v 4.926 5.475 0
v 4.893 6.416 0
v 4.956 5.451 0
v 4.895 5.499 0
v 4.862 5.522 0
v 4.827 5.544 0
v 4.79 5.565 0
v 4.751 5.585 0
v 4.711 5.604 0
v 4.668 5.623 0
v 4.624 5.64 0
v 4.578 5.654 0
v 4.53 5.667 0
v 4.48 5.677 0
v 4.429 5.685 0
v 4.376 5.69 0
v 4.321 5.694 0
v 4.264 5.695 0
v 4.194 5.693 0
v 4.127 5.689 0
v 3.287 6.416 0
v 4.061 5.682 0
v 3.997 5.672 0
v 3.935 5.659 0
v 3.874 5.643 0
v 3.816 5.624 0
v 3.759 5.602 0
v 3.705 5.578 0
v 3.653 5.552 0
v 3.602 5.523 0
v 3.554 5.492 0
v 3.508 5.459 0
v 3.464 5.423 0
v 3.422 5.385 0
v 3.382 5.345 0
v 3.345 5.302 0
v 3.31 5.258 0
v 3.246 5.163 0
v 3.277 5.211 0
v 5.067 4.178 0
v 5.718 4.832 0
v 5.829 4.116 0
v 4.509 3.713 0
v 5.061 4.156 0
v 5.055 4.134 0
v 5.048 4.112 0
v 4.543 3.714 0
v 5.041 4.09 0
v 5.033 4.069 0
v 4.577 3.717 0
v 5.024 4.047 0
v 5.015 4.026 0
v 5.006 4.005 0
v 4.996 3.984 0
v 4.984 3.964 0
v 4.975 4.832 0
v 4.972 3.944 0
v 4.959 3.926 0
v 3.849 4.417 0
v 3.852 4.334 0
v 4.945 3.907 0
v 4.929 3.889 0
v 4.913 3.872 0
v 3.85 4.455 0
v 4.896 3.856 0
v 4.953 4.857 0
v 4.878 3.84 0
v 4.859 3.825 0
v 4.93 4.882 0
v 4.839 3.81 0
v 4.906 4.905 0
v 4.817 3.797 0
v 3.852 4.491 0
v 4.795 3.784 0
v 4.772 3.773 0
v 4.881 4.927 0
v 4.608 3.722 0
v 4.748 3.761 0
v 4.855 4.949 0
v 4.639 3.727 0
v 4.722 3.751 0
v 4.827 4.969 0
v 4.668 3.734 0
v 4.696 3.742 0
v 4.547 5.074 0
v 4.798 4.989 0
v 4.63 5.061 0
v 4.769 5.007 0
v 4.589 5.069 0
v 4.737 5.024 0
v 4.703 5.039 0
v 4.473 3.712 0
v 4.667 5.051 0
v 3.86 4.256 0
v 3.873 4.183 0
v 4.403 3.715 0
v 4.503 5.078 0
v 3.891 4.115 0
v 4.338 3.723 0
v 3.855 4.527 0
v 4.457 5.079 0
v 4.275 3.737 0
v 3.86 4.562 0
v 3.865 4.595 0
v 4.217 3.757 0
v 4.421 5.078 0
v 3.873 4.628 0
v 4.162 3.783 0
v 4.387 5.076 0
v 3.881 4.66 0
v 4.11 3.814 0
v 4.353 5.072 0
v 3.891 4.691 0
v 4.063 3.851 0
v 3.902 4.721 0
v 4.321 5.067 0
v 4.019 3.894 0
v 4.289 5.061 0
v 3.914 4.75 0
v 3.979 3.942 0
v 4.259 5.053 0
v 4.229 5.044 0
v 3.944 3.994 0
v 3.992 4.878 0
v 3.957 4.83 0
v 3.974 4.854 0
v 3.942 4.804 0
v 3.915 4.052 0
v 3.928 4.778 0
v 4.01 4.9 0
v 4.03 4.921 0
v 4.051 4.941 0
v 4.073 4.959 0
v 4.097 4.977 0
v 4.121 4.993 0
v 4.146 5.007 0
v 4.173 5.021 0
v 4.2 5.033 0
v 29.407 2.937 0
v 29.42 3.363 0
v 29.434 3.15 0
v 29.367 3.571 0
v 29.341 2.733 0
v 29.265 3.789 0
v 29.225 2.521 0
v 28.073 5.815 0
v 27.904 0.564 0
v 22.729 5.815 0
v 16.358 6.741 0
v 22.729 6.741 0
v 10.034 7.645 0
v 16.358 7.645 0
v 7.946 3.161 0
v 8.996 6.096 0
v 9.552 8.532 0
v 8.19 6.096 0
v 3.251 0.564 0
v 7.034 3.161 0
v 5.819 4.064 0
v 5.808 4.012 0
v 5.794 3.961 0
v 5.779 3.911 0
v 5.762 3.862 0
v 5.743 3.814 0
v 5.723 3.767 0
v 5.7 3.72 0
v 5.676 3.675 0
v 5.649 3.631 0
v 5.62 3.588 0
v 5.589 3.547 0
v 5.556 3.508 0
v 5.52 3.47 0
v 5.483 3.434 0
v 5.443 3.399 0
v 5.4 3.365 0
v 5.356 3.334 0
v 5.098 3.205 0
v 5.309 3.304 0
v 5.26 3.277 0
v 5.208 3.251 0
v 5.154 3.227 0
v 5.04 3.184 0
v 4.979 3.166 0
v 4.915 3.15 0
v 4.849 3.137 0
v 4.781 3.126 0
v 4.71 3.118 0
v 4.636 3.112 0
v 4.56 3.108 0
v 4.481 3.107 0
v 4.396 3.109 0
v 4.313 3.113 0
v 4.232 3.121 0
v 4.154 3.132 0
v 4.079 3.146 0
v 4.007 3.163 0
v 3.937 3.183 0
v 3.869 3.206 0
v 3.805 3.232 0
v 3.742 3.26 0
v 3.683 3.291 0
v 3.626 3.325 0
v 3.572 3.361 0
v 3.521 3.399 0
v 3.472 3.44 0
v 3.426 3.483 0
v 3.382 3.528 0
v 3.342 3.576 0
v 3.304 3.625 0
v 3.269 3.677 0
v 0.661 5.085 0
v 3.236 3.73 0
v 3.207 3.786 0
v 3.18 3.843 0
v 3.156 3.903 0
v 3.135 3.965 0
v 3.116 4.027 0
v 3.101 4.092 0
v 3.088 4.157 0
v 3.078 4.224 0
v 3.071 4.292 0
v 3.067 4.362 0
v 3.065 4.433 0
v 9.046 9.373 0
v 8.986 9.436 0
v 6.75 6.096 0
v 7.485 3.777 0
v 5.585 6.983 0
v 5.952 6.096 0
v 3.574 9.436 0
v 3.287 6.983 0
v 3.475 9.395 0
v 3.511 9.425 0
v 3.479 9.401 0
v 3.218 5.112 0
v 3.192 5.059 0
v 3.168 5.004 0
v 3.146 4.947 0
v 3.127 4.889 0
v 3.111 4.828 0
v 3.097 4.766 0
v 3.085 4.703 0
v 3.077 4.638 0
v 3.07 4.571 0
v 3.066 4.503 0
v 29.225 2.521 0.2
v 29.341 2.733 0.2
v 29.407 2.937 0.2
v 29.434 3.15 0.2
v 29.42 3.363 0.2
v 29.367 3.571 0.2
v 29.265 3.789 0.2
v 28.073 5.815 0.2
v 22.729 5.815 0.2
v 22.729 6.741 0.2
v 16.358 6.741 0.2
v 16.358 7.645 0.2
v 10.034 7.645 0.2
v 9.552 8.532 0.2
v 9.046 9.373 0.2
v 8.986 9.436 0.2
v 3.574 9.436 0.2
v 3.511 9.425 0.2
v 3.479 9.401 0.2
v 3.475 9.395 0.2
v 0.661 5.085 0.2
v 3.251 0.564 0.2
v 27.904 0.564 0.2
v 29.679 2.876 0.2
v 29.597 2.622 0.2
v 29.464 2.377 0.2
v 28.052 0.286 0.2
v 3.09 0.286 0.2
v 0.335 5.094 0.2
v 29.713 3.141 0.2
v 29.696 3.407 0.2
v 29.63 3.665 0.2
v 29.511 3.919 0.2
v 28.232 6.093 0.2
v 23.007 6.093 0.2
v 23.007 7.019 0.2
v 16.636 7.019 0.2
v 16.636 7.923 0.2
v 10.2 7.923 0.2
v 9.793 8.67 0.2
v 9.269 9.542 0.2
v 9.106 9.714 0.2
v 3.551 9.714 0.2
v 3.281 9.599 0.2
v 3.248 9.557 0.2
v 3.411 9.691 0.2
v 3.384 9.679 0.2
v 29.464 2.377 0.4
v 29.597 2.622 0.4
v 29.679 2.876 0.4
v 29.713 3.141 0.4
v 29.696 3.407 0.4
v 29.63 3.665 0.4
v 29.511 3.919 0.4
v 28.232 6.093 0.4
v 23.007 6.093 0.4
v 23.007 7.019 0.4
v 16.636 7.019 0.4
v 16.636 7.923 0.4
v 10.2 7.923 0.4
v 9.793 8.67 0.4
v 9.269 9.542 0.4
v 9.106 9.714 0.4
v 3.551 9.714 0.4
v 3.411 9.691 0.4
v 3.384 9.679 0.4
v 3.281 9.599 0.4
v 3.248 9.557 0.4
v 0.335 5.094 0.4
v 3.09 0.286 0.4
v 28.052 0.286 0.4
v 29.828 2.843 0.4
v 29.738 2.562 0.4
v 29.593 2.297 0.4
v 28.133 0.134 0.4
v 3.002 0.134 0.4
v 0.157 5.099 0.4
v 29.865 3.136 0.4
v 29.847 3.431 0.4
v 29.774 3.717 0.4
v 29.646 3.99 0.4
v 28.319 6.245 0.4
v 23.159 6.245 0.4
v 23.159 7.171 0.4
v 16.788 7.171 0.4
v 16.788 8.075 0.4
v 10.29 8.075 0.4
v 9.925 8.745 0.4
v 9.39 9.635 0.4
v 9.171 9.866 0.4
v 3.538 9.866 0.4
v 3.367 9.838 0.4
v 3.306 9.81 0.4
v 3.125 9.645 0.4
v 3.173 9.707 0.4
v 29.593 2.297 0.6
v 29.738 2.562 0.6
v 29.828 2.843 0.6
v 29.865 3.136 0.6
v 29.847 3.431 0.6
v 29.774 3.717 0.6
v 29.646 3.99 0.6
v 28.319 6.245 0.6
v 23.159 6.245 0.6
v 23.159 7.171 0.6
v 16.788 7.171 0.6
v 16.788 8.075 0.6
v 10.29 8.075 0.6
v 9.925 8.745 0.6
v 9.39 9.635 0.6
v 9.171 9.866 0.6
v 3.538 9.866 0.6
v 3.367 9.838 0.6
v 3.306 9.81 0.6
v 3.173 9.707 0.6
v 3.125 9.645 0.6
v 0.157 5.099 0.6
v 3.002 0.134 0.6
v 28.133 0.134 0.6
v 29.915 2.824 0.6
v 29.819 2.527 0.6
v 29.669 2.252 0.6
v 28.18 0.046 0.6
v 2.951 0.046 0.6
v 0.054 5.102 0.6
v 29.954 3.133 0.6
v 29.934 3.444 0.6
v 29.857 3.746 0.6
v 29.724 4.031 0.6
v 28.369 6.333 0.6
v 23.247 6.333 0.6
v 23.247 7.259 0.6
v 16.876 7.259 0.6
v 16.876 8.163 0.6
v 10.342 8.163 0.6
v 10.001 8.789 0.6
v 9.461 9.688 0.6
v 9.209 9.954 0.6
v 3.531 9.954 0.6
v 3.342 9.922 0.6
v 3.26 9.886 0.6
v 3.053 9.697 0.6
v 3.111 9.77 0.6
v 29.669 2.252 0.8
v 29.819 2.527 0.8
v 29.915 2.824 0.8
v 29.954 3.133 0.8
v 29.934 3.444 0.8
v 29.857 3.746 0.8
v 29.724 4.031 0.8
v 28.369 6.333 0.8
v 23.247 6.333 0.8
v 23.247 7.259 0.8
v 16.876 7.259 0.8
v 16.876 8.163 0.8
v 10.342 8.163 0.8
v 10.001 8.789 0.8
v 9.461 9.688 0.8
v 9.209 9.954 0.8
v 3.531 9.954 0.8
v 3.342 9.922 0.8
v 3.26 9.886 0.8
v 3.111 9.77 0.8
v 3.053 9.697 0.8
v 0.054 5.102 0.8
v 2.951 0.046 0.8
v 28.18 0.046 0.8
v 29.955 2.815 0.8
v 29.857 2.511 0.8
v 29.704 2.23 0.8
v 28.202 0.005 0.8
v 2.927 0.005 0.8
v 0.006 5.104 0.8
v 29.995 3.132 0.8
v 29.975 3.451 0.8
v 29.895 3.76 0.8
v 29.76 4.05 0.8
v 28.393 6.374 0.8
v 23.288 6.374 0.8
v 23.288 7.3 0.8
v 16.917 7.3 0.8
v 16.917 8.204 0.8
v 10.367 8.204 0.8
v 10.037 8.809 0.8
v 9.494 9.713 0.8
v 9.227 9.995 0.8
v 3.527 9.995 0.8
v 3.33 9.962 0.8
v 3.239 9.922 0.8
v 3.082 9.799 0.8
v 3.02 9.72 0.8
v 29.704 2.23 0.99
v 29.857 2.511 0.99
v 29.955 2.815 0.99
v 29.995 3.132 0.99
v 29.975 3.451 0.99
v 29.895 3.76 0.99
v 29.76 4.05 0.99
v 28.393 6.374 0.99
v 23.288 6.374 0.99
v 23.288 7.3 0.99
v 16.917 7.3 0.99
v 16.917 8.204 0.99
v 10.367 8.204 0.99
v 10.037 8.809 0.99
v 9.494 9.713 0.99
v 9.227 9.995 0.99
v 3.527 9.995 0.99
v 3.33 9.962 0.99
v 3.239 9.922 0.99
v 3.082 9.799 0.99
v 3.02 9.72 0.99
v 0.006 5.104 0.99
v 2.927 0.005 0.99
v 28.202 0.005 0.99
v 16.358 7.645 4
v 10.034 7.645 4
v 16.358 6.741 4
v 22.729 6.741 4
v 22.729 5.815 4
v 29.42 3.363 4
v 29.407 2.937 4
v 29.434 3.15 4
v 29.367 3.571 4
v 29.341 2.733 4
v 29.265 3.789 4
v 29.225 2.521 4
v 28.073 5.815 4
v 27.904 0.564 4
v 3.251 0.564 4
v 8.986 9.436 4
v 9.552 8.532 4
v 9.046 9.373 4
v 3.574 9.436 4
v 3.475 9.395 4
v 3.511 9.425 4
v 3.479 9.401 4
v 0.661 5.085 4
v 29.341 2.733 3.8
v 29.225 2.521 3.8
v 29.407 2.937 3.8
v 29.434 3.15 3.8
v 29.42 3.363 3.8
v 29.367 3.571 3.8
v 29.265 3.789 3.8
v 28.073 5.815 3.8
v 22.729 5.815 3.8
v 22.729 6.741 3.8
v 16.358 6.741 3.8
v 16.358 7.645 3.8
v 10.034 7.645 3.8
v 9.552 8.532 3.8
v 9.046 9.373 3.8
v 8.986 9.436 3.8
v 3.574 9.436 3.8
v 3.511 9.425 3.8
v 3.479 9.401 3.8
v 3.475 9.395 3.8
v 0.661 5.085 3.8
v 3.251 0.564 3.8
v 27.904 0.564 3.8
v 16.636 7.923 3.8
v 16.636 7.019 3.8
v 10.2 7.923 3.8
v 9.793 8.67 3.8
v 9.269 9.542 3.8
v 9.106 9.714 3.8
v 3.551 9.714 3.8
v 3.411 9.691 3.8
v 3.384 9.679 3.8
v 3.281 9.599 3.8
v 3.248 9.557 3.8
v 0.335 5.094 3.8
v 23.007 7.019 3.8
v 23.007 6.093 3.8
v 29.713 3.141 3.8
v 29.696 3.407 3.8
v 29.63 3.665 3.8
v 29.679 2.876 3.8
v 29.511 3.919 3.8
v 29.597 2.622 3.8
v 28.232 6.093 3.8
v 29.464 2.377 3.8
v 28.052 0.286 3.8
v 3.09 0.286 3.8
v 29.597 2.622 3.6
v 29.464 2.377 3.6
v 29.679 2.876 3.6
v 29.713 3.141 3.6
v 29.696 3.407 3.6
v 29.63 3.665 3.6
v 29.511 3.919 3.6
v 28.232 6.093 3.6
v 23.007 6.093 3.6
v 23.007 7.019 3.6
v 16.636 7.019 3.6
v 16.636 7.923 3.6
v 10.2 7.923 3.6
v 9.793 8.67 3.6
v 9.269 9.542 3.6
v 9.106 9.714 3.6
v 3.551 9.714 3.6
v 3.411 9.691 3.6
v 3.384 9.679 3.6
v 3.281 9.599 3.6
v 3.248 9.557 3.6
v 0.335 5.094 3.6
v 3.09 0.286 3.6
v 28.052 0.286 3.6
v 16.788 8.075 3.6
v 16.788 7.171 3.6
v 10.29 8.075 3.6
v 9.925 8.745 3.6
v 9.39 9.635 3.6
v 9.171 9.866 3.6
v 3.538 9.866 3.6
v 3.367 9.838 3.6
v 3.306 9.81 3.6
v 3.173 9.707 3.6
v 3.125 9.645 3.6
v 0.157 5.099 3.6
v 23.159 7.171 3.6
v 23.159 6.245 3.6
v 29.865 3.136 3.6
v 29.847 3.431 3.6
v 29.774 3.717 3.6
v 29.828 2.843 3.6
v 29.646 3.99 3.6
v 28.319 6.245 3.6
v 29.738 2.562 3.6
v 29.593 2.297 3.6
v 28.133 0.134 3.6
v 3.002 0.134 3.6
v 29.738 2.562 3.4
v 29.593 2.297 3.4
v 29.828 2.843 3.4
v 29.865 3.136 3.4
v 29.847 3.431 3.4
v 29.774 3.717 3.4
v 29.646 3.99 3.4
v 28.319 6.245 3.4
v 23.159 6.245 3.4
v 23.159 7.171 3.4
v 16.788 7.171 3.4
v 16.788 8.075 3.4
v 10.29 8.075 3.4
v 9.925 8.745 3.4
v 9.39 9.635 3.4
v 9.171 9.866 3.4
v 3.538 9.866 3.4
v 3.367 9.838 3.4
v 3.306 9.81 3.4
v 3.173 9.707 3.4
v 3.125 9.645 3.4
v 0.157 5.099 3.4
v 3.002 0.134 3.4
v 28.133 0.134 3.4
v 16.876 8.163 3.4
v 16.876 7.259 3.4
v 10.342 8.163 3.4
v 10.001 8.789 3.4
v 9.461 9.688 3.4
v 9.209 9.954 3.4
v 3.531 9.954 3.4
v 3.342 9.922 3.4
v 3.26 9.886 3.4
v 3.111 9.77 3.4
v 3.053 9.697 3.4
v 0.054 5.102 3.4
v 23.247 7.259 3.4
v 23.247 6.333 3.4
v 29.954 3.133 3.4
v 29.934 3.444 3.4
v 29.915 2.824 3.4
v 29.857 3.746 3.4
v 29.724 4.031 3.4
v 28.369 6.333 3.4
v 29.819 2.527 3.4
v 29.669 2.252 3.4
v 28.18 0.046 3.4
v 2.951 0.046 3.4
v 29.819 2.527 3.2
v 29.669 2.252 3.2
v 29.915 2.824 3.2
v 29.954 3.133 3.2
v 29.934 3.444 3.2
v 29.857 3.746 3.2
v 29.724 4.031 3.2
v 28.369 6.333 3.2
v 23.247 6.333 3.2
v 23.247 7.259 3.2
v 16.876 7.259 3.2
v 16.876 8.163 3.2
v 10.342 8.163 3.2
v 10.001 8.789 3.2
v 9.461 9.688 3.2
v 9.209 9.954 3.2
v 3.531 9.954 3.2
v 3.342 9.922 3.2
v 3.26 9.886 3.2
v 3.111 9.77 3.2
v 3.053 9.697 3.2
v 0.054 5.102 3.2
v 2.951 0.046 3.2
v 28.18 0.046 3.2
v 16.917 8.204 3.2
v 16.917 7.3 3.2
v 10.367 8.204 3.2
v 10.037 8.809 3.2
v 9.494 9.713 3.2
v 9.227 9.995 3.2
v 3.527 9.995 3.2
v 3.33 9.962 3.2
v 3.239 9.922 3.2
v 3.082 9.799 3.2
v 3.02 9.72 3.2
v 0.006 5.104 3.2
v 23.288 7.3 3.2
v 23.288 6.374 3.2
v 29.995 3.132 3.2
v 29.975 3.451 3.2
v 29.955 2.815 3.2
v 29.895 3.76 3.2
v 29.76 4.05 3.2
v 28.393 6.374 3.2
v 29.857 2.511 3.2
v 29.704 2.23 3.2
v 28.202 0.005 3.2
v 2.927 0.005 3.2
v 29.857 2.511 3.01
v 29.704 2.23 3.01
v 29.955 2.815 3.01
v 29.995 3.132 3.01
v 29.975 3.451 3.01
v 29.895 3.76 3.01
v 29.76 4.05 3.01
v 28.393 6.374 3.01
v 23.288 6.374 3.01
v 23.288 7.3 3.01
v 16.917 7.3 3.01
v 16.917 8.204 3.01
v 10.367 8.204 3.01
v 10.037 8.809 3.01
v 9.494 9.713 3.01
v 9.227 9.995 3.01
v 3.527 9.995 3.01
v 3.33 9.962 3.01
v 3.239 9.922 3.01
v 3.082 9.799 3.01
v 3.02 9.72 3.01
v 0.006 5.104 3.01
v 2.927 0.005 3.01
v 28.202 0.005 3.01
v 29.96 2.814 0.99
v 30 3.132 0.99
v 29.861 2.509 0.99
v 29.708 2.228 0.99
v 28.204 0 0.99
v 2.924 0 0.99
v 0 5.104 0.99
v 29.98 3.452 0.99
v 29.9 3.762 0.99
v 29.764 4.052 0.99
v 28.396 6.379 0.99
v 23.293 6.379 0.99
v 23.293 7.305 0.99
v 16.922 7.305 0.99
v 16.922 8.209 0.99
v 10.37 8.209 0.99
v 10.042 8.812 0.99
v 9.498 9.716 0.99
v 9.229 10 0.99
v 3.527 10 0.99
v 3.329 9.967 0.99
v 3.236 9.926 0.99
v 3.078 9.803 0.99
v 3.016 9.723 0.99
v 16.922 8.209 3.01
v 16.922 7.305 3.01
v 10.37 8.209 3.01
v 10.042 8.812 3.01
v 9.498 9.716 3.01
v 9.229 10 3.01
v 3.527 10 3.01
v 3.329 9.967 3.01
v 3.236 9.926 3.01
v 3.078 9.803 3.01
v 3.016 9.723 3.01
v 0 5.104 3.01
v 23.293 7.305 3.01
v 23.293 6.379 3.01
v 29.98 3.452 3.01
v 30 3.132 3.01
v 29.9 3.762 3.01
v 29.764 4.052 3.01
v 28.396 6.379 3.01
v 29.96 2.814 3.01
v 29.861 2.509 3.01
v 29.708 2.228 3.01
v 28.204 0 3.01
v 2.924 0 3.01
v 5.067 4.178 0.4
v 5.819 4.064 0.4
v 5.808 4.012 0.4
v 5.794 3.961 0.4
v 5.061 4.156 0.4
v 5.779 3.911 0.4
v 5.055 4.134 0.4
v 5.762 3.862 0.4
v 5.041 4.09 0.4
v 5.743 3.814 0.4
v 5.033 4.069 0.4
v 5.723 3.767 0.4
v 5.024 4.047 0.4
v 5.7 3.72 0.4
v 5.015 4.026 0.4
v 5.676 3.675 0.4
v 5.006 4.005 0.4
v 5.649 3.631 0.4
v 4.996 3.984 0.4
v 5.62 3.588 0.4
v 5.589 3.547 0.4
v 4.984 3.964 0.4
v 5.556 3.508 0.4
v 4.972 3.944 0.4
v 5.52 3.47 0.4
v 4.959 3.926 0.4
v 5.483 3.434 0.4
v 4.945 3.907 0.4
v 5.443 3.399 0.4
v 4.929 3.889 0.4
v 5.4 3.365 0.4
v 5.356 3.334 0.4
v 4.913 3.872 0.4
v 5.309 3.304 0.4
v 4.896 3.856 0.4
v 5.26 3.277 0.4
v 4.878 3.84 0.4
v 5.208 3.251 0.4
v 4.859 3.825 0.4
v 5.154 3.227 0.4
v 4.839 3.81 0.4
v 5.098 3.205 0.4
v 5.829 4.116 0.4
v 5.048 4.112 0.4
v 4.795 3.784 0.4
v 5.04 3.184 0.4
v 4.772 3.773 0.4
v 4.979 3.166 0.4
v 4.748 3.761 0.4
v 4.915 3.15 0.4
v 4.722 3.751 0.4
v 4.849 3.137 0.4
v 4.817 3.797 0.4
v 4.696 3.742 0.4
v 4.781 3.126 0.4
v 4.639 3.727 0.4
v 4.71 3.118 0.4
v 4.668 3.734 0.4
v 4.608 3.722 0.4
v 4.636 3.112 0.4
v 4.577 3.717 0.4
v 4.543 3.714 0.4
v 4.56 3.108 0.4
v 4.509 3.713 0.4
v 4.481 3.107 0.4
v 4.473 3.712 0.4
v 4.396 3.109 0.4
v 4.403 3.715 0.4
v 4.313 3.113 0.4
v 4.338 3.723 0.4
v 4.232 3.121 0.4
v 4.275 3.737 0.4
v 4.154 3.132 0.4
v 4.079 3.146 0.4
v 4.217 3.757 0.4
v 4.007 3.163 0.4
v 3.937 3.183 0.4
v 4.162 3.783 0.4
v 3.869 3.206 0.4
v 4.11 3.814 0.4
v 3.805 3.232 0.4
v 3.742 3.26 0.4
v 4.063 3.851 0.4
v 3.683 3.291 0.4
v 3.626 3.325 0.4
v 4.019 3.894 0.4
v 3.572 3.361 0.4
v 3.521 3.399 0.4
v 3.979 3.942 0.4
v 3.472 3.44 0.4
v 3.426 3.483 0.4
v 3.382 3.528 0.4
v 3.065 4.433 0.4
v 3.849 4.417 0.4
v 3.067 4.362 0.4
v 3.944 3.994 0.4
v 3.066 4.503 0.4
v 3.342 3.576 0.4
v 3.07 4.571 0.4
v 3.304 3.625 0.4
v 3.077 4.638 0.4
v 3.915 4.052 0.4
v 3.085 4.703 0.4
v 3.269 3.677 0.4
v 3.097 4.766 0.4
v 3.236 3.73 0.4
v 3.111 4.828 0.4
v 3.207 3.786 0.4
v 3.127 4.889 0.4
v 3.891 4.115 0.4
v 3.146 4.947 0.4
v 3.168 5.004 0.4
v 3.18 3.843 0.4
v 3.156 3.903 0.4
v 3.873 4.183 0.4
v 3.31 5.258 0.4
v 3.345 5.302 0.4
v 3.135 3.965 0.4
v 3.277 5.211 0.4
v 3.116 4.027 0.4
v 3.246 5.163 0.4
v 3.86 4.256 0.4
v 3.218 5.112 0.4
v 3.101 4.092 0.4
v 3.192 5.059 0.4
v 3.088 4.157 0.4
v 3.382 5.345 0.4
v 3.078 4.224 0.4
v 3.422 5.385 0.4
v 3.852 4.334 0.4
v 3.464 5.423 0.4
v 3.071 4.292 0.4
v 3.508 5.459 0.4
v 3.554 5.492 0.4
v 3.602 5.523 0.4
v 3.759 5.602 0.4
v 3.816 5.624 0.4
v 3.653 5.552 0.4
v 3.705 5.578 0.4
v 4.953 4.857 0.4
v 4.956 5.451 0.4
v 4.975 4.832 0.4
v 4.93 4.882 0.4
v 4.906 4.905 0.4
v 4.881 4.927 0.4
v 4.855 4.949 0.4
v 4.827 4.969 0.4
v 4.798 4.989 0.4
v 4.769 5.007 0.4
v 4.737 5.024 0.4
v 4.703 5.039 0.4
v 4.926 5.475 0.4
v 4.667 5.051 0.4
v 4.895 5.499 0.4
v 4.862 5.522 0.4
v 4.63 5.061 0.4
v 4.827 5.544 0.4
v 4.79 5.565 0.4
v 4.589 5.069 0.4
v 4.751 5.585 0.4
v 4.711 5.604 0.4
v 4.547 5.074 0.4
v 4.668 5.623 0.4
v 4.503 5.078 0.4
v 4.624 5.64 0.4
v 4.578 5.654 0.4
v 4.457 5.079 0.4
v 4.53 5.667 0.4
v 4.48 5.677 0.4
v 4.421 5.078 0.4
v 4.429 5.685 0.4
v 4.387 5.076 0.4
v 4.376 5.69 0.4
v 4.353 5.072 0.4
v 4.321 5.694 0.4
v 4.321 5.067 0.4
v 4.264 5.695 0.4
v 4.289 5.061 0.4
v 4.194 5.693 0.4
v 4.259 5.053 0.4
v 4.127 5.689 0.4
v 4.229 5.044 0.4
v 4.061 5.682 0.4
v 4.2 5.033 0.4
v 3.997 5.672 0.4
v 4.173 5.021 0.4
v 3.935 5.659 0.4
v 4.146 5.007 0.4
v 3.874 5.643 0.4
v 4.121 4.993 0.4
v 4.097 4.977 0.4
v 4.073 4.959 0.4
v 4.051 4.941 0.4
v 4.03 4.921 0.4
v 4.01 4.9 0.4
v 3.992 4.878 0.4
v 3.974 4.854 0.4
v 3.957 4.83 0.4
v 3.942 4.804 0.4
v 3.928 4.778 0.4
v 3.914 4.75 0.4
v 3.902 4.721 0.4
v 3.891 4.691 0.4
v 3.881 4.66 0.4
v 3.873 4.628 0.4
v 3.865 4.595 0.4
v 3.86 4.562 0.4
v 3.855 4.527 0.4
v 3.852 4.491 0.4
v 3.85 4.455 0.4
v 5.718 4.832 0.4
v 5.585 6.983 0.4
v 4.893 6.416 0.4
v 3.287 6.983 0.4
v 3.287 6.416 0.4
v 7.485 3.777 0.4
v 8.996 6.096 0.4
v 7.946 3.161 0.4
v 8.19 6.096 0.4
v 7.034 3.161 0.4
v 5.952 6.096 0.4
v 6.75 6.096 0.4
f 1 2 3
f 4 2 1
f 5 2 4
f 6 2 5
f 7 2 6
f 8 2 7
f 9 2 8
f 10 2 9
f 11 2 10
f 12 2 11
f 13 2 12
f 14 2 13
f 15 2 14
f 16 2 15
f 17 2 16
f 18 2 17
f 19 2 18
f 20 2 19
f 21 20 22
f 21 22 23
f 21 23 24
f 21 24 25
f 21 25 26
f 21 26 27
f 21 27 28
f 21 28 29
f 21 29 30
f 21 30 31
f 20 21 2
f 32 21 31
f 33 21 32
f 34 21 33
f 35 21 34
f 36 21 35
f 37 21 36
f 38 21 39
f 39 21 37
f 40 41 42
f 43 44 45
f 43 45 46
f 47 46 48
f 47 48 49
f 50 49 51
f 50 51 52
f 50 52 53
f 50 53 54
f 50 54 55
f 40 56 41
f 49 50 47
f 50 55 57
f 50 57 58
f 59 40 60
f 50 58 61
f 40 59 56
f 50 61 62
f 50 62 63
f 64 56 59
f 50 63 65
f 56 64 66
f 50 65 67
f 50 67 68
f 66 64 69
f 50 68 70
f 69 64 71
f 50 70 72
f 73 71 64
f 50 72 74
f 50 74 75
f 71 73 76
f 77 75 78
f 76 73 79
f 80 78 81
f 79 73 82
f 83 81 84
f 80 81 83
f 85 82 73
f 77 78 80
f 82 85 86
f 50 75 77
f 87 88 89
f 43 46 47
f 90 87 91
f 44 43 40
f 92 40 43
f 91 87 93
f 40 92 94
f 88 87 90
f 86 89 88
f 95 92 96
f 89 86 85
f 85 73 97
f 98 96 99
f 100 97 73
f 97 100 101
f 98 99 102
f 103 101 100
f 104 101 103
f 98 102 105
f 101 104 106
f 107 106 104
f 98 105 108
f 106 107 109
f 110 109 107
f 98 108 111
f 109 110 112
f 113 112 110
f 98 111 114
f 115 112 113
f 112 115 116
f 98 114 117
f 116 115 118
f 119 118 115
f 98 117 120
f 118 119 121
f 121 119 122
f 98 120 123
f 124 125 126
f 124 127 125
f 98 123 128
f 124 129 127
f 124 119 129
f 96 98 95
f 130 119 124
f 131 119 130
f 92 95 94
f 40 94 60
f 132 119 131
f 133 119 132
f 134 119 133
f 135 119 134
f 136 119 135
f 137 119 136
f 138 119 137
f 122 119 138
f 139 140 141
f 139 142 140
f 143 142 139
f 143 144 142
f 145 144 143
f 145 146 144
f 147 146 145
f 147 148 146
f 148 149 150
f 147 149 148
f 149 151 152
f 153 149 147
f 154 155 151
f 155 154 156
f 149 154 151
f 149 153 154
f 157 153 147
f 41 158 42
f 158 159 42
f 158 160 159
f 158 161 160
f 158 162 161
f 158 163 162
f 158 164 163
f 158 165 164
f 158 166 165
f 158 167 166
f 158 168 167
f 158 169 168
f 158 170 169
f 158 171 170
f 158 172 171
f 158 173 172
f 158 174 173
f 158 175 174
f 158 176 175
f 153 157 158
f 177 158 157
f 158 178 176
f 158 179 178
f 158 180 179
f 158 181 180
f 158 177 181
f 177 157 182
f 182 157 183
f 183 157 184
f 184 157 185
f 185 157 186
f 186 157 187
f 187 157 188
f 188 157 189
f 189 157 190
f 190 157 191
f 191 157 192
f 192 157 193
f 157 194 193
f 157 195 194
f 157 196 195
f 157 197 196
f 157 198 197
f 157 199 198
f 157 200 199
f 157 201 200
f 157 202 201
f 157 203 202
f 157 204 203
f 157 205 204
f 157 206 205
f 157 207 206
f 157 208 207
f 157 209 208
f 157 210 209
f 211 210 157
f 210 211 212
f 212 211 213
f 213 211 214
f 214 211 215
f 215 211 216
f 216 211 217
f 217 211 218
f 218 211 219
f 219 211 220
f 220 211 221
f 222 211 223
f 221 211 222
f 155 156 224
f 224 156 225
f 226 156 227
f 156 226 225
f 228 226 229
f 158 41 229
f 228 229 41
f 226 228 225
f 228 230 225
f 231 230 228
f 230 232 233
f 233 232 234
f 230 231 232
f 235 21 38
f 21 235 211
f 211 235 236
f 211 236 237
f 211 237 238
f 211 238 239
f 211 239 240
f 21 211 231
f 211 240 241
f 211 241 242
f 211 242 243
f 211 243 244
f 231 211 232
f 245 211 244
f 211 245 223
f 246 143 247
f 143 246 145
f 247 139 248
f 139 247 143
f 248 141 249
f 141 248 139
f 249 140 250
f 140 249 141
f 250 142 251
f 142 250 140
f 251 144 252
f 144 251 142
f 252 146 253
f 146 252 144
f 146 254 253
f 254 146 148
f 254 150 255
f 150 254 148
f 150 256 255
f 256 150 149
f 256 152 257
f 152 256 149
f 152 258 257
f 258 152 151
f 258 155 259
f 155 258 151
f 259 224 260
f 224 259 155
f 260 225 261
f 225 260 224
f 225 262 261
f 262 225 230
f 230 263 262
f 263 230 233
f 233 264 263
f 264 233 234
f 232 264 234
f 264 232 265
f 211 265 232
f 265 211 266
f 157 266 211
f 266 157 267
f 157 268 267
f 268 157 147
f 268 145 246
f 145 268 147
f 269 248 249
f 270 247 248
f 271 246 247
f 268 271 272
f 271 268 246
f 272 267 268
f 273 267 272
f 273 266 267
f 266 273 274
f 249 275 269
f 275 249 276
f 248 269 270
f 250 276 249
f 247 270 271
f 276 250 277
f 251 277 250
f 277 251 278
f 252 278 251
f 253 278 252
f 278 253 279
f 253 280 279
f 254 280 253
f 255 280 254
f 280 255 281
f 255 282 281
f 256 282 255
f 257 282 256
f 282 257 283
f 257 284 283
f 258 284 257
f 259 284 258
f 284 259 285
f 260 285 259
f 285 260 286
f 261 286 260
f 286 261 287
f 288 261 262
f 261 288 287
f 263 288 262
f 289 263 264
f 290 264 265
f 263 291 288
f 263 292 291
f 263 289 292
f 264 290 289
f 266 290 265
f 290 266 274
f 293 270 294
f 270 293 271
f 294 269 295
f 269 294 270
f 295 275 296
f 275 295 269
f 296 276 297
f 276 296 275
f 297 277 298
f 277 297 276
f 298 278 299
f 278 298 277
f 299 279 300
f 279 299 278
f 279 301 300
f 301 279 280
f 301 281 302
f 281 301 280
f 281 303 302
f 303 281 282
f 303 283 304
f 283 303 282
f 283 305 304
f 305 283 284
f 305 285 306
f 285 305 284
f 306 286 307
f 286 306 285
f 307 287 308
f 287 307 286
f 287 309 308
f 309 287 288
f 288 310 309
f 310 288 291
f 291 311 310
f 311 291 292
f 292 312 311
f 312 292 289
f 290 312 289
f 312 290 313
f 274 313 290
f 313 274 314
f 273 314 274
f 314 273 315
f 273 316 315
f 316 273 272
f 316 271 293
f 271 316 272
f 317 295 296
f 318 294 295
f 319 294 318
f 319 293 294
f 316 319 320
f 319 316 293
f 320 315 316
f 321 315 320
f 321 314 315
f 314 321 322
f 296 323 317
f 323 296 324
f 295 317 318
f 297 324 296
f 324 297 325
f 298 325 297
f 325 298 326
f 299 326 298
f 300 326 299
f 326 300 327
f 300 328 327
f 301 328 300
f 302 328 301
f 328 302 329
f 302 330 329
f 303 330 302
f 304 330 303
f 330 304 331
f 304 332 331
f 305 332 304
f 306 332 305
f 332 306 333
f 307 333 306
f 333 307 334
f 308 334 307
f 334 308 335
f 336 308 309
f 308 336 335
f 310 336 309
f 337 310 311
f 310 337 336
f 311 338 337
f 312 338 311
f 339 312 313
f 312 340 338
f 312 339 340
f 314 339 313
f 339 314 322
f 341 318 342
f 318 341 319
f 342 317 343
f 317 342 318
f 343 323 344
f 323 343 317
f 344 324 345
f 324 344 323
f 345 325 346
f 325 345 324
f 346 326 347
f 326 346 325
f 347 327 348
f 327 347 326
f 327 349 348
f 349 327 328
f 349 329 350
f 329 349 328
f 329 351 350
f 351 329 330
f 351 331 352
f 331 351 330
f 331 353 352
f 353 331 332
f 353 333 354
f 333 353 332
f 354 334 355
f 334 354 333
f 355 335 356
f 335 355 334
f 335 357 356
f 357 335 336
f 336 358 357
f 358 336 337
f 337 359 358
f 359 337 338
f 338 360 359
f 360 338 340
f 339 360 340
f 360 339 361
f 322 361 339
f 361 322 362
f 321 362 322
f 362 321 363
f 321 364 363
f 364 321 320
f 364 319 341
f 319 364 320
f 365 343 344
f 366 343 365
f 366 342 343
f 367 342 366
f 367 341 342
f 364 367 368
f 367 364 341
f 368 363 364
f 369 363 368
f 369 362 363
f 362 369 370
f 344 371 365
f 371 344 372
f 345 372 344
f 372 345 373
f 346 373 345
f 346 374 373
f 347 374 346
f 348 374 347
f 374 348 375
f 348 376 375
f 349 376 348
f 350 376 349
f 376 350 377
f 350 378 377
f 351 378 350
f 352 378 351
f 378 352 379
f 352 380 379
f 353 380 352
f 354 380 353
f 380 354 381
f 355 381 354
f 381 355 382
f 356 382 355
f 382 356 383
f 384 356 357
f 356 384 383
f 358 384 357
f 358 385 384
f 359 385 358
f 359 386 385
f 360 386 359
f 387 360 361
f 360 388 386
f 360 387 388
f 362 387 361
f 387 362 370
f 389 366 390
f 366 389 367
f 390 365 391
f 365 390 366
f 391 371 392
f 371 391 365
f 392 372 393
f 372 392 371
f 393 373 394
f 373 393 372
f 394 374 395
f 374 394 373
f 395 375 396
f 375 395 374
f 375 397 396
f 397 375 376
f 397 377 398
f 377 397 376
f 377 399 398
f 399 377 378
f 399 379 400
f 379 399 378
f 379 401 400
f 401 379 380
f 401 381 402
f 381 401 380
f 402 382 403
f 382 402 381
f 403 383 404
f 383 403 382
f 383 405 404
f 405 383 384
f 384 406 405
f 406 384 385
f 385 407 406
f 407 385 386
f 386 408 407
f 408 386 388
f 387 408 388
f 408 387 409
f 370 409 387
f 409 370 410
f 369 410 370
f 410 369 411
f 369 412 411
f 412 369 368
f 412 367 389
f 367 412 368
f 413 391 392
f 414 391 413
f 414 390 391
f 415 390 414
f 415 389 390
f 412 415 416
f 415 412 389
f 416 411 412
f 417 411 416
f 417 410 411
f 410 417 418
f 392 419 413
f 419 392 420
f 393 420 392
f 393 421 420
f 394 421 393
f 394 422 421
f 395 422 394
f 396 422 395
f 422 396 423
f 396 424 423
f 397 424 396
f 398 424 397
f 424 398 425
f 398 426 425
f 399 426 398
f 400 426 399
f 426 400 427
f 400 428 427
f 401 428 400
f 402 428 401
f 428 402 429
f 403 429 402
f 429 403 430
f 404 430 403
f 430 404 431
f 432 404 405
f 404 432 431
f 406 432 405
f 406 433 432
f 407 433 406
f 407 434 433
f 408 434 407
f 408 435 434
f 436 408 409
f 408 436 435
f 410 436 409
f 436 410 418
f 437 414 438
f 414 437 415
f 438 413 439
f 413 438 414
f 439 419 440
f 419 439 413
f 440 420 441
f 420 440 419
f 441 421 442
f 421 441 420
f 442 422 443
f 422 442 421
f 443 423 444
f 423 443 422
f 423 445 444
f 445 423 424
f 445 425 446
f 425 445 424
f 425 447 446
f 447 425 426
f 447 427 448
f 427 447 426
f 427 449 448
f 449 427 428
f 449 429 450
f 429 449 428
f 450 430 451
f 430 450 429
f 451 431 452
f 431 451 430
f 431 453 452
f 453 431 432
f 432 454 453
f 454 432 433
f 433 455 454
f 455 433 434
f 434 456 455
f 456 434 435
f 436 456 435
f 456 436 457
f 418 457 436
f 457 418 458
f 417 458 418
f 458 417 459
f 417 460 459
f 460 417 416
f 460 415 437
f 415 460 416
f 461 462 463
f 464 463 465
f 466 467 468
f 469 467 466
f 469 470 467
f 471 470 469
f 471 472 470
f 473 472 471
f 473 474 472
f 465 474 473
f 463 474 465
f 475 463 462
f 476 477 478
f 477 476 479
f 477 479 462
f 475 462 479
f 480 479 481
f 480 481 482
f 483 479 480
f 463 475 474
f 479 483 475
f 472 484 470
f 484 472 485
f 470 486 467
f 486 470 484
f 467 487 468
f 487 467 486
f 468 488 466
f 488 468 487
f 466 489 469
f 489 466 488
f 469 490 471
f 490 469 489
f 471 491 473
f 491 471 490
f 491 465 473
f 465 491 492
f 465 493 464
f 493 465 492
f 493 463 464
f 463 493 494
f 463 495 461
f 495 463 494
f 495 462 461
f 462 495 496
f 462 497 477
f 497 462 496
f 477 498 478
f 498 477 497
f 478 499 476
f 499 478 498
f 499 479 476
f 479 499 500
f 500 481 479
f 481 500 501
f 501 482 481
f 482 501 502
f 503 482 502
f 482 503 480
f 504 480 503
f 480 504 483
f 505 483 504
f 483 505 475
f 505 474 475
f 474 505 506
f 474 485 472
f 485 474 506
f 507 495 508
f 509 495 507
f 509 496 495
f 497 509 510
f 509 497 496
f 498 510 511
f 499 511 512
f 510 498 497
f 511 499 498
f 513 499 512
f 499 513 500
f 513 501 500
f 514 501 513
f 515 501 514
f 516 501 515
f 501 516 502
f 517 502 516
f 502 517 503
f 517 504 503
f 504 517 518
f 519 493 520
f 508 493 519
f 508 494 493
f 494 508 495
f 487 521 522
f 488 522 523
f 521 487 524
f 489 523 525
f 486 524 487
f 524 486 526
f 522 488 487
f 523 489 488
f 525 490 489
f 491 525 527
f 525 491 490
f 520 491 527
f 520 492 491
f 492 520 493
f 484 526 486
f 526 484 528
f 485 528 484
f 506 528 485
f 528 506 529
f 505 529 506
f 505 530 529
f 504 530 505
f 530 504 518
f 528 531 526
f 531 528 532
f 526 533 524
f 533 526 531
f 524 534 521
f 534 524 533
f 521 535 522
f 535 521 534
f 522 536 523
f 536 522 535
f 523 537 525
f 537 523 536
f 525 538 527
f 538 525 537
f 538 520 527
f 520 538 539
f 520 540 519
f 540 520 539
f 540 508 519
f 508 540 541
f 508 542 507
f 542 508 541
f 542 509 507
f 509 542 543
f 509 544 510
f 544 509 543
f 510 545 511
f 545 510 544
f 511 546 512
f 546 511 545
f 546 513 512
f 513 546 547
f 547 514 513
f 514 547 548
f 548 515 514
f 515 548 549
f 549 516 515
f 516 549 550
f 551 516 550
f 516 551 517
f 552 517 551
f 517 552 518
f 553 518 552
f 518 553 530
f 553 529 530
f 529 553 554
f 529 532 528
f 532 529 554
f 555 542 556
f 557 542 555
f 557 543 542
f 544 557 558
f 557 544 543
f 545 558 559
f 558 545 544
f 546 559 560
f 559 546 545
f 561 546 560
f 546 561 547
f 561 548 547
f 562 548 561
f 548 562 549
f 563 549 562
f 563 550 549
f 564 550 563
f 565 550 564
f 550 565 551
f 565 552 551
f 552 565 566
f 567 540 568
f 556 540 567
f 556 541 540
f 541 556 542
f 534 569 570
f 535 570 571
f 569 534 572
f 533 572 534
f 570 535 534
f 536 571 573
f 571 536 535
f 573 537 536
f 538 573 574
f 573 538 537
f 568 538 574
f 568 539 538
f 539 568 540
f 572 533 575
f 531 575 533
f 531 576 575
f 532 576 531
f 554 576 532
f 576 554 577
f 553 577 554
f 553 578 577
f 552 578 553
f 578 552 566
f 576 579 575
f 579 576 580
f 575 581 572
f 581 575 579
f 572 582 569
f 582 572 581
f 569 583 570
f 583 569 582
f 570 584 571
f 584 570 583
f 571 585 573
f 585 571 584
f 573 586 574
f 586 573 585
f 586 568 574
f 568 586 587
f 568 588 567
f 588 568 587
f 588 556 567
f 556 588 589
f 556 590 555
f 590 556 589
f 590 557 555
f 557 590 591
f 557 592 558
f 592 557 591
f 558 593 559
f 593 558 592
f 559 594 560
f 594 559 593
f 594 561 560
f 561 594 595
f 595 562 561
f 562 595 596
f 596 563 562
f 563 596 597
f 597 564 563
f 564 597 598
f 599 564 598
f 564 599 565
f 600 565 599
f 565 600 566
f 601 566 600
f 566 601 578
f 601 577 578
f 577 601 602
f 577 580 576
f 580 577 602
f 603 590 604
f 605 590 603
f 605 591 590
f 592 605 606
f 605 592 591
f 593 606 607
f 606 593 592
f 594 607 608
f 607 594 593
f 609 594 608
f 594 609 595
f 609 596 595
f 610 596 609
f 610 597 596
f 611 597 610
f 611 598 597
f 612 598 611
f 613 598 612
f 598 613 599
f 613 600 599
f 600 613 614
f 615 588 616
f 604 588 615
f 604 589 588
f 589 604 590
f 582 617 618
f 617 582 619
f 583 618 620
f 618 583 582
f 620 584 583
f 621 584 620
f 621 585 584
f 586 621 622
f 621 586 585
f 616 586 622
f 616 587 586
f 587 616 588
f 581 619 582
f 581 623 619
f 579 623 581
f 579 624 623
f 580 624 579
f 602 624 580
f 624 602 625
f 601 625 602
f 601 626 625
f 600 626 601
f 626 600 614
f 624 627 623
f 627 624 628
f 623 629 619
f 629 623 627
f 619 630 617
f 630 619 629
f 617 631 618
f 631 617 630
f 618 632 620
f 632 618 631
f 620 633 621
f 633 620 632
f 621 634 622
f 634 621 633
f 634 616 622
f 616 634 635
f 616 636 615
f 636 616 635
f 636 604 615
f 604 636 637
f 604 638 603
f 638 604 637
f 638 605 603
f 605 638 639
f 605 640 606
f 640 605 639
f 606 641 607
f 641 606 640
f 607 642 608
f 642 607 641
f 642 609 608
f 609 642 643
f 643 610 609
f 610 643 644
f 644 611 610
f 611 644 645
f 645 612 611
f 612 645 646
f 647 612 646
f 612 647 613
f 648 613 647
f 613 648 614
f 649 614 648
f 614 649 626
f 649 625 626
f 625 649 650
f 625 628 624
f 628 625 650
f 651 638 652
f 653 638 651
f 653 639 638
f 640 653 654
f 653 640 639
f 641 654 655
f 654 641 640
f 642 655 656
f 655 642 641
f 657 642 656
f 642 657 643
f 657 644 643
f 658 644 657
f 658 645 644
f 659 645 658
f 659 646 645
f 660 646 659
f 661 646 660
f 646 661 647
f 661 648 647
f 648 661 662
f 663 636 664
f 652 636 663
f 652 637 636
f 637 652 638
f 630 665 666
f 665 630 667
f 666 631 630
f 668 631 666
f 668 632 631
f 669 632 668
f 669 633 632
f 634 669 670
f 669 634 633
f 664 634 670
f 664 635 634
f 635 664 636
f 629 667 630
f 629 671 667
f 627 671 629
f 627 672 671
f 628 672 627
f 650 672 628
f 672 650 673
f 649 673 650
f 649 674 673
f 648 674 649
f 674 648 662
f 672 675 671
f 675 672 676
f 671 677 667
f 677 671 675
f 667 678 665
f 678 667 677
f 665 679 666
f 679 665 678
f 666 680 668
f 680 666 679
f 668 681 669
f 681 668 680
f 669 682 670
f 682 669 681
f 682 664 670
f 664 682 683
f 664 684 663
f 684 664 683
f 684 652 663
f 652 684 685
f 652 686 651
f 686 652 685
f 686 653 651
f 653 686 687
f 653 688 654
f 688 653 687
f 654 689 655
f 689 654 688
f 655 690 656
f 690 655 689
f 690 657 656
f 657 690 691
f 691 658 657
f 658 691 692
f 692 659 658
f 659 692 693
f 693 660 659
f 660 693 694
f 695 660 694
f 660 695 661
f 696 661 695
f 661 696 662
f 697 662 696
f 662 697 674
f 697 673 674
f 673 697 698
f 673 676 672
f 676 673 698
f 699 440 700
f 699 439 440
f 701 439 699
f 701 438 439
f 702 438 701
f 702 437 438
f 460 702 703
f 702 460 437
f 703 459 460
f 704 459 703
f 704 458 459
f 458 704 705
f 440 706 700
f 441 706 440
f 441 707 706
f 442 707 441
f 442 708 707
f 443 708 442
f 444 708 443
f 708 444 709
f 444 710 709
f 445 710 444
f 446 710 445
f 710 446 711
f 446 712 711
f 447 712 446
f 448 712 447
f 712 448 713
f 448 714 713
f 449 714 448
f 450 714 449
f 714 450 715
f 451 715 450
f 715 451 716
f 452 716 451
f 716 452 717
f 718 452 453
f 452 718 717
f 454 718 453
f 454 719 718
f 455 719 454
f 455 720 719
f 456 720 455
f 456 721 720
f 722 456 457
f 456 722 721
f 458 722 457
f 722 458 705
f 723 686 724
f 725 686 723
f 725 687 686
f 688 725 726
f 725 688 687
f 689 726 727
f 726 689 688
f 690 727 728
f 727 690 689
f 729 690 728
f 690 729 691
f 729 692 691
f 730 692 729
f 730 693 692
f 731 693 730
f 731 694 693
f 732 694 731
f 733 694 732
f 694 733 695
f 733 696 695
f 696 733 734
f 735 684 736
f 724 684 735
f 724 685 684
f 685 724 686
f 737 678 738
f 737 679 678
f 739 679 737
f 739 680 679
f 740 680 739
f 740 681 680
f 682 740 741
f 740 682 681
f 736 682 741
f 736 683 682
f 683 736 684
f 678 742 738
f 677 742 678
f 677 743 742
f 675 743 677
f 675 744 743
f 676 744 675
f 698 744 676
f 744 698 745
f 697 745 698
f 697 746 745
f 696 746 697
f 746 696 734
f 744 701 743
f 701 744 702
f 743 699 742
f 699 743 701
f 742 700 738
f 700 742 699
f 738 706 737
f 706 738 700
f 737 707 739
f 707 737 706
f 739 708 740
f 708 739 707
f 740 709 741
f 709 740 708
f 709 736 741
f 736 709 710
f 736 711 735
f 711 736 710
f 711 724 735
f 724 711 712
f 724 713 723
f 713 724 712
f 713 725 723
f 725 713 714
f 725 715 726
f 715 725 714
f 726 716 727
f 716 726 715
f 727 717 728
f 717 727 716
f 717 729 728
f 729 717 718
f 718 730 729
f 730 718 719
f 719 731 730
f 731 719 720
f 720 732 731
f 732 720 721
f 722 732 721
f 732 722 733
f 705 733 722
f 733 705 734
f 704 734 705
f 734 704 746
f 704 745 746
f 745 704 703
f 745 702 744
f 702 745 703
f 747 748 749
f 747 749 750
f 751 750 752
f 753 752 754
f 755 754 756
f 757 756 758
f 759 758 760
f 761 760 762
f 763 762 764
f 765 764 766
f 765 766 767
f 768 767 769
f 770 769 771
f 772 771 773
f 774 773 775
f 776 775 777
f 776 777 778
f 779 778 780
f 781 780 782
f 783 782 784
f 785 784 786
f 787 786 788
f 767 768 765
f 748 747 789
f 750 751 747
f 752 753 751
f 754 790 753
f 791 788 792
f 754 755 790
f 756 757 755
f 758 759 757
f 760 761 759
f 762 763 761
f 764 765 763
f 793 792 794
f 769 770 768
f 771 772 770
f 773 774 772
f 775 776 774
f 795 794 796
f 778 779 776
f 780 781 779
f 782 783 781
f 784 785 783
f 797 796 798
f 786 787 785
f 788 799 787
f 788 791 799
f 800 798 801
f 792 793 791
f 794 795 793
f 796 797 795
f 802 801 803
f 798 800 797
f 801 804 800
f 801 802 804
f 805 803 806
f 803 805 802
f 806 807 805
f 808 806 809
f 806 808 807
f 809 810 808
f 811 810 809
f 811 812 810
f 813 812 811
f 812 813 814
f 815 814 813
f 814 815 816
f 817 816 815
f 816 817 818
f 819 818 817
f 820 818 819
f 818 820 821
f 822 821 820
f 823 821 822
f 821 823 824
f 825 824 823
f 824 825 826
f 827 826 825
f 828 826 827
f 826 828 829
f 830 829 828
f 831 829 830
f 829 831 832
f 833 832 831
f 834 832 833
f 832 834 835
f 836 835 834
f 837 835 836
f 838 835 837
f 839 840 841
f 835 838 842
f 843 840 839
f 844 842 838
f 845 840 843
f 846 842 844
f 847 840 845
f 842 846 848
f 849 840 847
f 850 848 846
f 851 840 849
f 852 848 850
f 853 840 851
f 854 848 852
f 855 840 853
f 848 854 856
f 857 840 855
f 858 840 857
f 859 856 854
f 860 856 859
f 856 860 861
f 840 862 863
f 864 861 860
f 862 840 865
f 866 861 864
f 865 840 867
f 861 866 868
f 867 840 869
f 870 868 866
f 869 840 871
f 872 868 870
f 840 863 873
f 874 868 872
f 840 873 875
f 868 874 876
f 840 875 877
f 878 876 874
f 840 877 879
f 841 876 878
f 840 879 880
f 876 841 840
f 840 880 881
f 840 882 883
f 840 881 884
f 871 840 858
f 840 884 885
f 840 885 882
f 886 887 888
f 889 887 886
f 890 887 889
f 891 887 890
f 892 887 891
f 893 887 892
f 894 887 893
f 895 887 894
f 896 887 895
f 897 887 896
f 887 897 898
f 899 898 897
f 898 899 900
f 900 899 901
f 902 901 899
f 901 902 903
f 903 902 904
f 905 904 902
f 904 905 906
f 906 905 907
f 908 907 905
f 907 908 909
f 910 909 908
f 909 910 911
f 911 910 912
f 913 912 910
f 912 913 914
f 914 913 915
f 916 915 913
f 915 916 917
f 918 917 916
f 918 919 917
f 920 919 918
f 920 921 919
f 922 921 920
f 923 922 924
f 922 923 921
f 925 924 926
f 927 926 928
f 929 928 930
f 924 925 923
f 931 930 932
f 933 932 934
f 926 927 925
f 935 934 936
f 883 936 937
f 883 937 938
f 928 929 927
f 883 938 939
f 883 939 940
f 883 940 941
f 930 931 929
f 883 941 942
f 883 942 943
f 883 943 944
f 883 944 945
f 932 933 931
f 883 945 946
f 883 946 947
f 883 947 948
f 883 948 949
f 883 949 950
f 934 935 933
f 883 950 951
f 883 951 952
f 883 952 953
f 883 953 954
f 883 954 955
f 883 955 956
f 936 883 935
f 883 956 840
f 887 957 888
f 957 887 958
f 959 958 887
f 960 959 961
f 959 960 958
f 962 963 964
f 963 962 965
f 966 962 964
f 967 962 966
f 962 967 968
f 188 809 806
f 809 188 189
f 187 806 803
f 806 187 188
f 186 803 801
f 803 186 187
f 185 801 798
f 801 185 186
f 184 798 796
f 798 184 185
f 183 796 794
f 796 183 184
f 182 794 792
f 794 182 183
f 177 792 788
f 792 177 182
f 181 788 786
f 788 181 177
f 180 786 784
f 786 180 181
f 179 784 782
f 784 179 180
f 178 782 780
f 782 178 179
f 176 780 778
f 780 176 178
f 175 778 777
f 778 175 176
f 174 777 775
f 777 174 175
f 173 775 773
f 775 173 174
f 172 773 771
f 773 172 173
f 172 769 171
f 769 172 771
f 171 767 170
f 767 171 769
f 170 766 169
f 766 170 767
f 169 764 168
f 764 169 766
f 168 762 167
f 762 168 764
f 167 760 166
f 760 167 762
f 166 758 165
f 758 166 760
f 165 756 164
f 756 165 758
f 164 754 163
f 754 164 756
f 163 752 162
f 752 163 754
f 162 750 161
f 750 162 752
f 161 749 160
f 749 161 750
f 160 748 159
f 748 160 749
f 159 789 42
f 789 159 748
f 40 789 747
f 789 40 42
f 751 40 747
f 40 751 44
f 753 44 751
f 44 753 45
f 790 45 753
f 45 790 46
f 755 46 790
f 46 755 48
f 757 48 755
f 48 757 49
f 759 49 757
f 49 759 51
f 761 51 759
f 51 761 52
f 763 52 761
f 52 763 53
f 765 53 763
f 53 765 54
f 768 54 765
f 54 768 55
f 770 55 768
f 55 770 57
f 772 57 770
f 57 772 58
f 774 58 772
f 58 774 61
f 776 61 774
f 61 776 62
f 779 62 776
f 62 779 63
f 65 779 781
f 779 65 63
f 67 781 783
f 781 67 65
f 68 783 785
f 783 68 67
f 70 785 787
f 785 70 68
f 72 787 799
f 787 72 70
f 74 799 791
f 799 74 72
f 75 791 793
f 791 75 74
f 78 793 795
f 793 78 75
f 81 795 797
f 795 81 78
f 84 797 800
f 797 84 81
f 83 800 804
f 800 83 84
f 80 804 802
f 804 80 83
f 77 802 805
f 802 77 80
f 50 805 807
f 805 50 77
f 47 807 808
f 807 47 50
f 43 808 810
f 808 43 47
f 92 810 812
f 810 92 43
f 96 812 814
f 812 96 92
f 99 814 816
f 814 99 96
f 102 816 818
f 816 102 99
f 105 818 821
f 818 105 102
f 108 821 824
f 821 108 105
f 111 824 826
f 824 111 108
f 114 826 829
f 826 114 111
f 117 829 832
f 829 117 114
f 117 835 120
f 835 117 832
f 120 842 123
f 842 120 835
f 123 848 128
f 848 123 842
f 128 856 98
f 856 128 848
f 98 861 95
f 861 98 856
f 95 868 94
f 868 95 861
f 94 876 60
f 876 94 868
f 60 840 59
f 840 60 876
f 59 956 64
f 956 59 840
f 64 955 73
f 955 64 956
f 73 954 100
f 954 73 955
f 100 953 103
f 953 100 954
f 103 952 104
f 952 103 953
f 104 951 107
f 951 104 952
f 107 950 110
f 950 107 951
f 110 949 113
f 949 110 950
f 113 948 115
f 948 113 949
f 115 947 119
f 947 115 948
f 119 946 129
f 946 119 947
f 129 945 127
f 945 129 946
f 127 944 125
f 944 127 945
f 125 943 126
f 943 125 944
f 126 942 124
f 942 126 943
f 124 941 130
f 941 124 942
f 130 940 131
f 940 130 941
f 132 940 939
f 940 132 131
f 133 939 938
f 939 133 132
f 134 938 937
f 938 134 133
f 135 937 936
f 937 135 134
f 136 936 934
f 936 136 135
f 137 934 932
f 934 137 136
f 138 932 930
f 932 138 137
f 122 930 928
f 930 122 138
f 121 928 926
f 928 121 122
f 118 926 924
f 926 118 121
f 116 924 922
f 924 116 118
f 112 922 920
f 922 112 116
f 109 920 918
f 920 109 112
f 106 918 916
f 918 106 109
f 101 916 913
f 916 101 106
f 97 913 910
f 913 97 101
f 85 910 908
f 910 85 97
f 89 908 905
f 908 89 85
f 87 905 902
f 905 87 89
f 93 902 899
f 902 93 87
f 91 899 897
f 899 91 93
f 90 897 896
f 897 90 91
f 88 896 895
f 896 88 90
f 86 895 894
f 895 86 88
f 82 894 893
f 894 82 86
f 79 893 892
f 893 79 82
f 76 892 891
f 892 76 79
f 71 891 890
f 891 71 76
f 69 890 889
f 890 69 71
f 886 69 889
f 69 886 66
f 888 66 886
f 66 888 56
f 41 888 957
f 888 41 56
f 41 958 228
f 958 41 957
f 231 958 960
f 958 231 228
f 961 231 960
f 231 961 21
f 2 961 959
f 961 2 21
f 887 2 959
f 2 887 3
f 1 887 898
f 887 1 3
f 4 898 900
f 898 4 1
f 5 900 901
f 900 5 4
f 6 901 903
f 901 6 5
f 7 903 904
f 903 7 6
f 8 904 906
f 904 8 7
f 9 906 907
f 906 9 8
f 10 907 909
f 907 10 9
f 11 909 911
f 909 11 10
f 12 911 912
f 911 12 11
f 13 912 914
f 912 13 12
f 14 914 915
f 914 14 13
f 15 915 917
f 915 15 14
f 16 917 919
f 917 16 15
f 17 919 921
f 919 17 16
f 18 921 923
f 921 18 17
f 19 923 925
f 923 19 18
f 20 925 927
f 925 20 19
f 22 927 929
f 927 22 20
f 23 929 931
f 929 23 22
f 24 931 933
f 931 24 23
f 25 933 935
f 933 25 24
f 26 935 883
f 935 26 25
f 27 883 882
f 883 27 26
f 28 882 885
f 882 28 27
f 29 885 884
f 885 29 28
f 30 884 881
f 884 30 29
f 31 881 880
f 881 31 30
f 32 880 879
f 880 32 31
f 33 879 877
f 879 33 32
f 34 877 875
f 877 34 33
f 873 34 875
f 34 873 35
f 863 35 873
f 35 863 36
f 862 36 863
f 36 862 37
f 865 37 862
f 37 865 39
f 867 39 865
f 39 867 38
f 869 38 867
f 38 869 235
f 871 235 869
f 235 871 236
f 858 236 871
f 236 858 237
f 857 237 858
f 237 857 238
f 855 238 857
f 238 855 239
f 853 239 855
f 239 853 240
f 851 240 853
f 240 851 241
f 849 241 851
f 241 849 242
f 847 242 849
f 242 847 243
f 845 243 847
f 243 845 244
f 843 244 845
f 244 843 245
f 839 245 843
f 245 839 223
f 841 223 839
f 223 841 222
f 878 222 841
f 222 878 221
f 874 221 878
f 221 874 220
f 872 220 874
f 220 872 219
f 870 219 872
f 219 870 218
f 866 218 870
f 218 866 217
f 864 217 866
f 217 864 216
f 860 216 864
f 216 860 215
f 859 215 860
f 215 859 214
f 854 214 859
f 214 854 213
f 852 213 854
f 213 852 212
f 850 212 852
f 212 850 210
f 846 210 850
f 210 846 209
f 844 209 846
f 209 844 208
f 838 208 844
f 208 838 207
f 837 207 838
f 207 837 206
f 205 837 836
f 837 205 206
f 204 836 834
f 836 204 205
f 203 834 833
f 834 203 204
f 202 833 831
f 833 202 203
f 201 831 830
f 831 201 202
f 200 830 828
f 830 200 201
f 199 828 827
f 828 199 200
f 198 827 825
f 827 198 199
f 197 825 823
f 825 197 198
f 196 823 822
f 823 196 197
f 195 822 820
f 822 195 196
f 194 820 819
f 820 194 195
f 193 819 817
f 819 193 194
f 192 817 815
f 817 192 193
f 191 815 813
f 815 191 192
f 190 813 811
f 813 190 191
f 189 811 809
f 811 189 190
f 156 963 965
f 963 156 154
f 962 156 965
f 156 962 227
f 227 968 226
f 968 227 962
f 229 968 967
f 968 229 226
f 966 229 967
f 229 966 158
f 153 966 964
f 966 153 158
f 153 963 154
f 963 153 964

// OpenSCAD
// test3 — generated by protobot from a sketch (input.jpg)
// 2026-10-28
//
// Print: Prusa Core One, 0.4 mm nozzle, PLA, 0.2 mm layers, flat on the bed.
// The outline is stored in a 0..1 unit box and scaled by LENGTH/WIDTH, so
// the three measurements below are all you need to change. Re-export with:
//   openscad --backend=manifold --export-format binstl -o test3.stl test3.scad
//
// Dimension tags: [M] = given by the user, [S] = traced from the sketch.

/* [Measurements] */
LENGTH    = 30;   // [M] X extent, mm
WIDTH     = 10;   // [M] Y extent, mm
THICKNESS = 4;   // [M] extrusion height, mm

/* [Edge finish] */
// Perimeter edges (outline AND holes), top and bottom faces.
// "fillet" = rounded, "chamfer" = 45°, "none" = sharp. Built in LAYER steps,
// i.e. exactly as the printer will lay it down.
EDGE_TOP_KIND    = "fillet";
EDGE_TOP         = 1;     // mm
EDGE_BOTTOM_KIND = "fillet";
EDGE_BOTTOM      = 1;     // mm
LAYER            = 0.2;   // mm, print layer height

/* [Version stamp] */
VERSION        = 5;       // bump every revision
VERSION_POS    = [0.2000, 0.5000];  // [S] unit-box spot deepest inside the shape
VERSION_SIZE   = 4;      // mm text height
VERSION_DEPTH  = 0.4;    // mm, 2 layers at 0.2

/* [Hidden] */
// [S] traced outline (+ holes), unit box, y up.
OUTLINE_PTS = [
    [0.94652,0.63789], [0.99215,0.40522], [0.99668,0.37621], [0.99933,0.34517], [1.00000,0.31319], [0.99867,0.28140],
    [0.99539,0.25091], [0.99027,0.22279], [0.94014,0.00000], [0.09748,0.00000], [0.00000,0.51040], [0.10054,0.97234],
    [0.10261,0.98029], [0.10789,0.99264], [0.11097,0.99669], [0.11758,1.00000], [0.30764,1.00000], [0.31660,0.97162],
    [0.33472,0.88120], [0.34567,0.82088], [0.56407,0.82088], [0.56407,0.73052], [0.77645,0.73052], [0.77645,0.63789]
];
OUTLINE_PATHS = [
    [for (i = [0:23]) i]
];

module outline_2d() {
    scale([LENGTH, WIDTH]) polygon(points = OUTLINE_PTS, paths = OUTLINE_PATHS);
}

// Debossed into the bottom face, mirrored so it reads from underneath.
module version_stamp() {
    if (!is_undef(VERSION_POS) && VERSION_SIZE > 0)
        translate([VERSION_POS[0] * LENGTH, VERSION_POS[1] * WIDTH, -0.01])
            linear_extrude(VERSION_DEPTH + 0.01)
                mirror([1, 0])
                    text(str("v", VERSION), size = VERSION_SIZE,
                         font = "Liberation Sans:style=Bold",
                         halign = "center", valign = "center");
}

// How far the outline is pulled in at depth d (0..r) into a finished edge.
function edge_inset(kind, r, d) =
    kind == "chamfer" ? max(0, r - d) :
    kind == "fillet"  ? r - sqrt(max(0, r * r - (r - min(d, r)) * (r - min(d, r)))) : 0;

module body() {
    nb = EDGE_BOTTOM_KIND == "none" ? 0 : ceil(EDGE_BOTTOM / LAYER - 1e-6);
    nt = EDGE_TOP_KIND    == "none" ? 0 : ceil(EDGE_TOP / LAYER - 1e-6);
    zb = nb * LAYER;
    zt = nt * LAYER;
    union() {
        // straight-walled core, overlapping the finished layers (no shared faces)
        translate([0, 0, zb - (nb > 0 ? 0.01 : 0)])
            linear_extrude(THICKNESS - zb - zt + (nb > 0 ? 0.01 : 0) + (nt > 0 ? 0.01 : 0))
                outline_2d();
        if (nb > 0) for (i = [0 : nb - 1])
            translate([0, 0, i * LAYER])
                linear_extrude(LAYER + 0.01)
                    offset(delta = -edge_inset(EDGE_BOTTOM_KIND, EDGE_BOTTOM, (i + 0.5) * LAYER))
                        outline_2d();
        if (nt > 0) for (i = [0 : nt - 1])
            translate([0, 0, THICKNESS - (i + 1) * LAYER - (i < nt - 1 ? 0.01 : 0)])
                linear_extrude(LAYER + (i < nt - 1 ? 0.01 : 0))
                    offset(delta = -edge_inset(EDGE_TOP_KIND, EDGE_TOP, (i + 0.5) * LAYER))
                        outline_2d();
    }
}

module part() {
    $fa = 2; $fs = 0.4;
    difference() {
        body();
        version_stamp();
    }
}

part();
